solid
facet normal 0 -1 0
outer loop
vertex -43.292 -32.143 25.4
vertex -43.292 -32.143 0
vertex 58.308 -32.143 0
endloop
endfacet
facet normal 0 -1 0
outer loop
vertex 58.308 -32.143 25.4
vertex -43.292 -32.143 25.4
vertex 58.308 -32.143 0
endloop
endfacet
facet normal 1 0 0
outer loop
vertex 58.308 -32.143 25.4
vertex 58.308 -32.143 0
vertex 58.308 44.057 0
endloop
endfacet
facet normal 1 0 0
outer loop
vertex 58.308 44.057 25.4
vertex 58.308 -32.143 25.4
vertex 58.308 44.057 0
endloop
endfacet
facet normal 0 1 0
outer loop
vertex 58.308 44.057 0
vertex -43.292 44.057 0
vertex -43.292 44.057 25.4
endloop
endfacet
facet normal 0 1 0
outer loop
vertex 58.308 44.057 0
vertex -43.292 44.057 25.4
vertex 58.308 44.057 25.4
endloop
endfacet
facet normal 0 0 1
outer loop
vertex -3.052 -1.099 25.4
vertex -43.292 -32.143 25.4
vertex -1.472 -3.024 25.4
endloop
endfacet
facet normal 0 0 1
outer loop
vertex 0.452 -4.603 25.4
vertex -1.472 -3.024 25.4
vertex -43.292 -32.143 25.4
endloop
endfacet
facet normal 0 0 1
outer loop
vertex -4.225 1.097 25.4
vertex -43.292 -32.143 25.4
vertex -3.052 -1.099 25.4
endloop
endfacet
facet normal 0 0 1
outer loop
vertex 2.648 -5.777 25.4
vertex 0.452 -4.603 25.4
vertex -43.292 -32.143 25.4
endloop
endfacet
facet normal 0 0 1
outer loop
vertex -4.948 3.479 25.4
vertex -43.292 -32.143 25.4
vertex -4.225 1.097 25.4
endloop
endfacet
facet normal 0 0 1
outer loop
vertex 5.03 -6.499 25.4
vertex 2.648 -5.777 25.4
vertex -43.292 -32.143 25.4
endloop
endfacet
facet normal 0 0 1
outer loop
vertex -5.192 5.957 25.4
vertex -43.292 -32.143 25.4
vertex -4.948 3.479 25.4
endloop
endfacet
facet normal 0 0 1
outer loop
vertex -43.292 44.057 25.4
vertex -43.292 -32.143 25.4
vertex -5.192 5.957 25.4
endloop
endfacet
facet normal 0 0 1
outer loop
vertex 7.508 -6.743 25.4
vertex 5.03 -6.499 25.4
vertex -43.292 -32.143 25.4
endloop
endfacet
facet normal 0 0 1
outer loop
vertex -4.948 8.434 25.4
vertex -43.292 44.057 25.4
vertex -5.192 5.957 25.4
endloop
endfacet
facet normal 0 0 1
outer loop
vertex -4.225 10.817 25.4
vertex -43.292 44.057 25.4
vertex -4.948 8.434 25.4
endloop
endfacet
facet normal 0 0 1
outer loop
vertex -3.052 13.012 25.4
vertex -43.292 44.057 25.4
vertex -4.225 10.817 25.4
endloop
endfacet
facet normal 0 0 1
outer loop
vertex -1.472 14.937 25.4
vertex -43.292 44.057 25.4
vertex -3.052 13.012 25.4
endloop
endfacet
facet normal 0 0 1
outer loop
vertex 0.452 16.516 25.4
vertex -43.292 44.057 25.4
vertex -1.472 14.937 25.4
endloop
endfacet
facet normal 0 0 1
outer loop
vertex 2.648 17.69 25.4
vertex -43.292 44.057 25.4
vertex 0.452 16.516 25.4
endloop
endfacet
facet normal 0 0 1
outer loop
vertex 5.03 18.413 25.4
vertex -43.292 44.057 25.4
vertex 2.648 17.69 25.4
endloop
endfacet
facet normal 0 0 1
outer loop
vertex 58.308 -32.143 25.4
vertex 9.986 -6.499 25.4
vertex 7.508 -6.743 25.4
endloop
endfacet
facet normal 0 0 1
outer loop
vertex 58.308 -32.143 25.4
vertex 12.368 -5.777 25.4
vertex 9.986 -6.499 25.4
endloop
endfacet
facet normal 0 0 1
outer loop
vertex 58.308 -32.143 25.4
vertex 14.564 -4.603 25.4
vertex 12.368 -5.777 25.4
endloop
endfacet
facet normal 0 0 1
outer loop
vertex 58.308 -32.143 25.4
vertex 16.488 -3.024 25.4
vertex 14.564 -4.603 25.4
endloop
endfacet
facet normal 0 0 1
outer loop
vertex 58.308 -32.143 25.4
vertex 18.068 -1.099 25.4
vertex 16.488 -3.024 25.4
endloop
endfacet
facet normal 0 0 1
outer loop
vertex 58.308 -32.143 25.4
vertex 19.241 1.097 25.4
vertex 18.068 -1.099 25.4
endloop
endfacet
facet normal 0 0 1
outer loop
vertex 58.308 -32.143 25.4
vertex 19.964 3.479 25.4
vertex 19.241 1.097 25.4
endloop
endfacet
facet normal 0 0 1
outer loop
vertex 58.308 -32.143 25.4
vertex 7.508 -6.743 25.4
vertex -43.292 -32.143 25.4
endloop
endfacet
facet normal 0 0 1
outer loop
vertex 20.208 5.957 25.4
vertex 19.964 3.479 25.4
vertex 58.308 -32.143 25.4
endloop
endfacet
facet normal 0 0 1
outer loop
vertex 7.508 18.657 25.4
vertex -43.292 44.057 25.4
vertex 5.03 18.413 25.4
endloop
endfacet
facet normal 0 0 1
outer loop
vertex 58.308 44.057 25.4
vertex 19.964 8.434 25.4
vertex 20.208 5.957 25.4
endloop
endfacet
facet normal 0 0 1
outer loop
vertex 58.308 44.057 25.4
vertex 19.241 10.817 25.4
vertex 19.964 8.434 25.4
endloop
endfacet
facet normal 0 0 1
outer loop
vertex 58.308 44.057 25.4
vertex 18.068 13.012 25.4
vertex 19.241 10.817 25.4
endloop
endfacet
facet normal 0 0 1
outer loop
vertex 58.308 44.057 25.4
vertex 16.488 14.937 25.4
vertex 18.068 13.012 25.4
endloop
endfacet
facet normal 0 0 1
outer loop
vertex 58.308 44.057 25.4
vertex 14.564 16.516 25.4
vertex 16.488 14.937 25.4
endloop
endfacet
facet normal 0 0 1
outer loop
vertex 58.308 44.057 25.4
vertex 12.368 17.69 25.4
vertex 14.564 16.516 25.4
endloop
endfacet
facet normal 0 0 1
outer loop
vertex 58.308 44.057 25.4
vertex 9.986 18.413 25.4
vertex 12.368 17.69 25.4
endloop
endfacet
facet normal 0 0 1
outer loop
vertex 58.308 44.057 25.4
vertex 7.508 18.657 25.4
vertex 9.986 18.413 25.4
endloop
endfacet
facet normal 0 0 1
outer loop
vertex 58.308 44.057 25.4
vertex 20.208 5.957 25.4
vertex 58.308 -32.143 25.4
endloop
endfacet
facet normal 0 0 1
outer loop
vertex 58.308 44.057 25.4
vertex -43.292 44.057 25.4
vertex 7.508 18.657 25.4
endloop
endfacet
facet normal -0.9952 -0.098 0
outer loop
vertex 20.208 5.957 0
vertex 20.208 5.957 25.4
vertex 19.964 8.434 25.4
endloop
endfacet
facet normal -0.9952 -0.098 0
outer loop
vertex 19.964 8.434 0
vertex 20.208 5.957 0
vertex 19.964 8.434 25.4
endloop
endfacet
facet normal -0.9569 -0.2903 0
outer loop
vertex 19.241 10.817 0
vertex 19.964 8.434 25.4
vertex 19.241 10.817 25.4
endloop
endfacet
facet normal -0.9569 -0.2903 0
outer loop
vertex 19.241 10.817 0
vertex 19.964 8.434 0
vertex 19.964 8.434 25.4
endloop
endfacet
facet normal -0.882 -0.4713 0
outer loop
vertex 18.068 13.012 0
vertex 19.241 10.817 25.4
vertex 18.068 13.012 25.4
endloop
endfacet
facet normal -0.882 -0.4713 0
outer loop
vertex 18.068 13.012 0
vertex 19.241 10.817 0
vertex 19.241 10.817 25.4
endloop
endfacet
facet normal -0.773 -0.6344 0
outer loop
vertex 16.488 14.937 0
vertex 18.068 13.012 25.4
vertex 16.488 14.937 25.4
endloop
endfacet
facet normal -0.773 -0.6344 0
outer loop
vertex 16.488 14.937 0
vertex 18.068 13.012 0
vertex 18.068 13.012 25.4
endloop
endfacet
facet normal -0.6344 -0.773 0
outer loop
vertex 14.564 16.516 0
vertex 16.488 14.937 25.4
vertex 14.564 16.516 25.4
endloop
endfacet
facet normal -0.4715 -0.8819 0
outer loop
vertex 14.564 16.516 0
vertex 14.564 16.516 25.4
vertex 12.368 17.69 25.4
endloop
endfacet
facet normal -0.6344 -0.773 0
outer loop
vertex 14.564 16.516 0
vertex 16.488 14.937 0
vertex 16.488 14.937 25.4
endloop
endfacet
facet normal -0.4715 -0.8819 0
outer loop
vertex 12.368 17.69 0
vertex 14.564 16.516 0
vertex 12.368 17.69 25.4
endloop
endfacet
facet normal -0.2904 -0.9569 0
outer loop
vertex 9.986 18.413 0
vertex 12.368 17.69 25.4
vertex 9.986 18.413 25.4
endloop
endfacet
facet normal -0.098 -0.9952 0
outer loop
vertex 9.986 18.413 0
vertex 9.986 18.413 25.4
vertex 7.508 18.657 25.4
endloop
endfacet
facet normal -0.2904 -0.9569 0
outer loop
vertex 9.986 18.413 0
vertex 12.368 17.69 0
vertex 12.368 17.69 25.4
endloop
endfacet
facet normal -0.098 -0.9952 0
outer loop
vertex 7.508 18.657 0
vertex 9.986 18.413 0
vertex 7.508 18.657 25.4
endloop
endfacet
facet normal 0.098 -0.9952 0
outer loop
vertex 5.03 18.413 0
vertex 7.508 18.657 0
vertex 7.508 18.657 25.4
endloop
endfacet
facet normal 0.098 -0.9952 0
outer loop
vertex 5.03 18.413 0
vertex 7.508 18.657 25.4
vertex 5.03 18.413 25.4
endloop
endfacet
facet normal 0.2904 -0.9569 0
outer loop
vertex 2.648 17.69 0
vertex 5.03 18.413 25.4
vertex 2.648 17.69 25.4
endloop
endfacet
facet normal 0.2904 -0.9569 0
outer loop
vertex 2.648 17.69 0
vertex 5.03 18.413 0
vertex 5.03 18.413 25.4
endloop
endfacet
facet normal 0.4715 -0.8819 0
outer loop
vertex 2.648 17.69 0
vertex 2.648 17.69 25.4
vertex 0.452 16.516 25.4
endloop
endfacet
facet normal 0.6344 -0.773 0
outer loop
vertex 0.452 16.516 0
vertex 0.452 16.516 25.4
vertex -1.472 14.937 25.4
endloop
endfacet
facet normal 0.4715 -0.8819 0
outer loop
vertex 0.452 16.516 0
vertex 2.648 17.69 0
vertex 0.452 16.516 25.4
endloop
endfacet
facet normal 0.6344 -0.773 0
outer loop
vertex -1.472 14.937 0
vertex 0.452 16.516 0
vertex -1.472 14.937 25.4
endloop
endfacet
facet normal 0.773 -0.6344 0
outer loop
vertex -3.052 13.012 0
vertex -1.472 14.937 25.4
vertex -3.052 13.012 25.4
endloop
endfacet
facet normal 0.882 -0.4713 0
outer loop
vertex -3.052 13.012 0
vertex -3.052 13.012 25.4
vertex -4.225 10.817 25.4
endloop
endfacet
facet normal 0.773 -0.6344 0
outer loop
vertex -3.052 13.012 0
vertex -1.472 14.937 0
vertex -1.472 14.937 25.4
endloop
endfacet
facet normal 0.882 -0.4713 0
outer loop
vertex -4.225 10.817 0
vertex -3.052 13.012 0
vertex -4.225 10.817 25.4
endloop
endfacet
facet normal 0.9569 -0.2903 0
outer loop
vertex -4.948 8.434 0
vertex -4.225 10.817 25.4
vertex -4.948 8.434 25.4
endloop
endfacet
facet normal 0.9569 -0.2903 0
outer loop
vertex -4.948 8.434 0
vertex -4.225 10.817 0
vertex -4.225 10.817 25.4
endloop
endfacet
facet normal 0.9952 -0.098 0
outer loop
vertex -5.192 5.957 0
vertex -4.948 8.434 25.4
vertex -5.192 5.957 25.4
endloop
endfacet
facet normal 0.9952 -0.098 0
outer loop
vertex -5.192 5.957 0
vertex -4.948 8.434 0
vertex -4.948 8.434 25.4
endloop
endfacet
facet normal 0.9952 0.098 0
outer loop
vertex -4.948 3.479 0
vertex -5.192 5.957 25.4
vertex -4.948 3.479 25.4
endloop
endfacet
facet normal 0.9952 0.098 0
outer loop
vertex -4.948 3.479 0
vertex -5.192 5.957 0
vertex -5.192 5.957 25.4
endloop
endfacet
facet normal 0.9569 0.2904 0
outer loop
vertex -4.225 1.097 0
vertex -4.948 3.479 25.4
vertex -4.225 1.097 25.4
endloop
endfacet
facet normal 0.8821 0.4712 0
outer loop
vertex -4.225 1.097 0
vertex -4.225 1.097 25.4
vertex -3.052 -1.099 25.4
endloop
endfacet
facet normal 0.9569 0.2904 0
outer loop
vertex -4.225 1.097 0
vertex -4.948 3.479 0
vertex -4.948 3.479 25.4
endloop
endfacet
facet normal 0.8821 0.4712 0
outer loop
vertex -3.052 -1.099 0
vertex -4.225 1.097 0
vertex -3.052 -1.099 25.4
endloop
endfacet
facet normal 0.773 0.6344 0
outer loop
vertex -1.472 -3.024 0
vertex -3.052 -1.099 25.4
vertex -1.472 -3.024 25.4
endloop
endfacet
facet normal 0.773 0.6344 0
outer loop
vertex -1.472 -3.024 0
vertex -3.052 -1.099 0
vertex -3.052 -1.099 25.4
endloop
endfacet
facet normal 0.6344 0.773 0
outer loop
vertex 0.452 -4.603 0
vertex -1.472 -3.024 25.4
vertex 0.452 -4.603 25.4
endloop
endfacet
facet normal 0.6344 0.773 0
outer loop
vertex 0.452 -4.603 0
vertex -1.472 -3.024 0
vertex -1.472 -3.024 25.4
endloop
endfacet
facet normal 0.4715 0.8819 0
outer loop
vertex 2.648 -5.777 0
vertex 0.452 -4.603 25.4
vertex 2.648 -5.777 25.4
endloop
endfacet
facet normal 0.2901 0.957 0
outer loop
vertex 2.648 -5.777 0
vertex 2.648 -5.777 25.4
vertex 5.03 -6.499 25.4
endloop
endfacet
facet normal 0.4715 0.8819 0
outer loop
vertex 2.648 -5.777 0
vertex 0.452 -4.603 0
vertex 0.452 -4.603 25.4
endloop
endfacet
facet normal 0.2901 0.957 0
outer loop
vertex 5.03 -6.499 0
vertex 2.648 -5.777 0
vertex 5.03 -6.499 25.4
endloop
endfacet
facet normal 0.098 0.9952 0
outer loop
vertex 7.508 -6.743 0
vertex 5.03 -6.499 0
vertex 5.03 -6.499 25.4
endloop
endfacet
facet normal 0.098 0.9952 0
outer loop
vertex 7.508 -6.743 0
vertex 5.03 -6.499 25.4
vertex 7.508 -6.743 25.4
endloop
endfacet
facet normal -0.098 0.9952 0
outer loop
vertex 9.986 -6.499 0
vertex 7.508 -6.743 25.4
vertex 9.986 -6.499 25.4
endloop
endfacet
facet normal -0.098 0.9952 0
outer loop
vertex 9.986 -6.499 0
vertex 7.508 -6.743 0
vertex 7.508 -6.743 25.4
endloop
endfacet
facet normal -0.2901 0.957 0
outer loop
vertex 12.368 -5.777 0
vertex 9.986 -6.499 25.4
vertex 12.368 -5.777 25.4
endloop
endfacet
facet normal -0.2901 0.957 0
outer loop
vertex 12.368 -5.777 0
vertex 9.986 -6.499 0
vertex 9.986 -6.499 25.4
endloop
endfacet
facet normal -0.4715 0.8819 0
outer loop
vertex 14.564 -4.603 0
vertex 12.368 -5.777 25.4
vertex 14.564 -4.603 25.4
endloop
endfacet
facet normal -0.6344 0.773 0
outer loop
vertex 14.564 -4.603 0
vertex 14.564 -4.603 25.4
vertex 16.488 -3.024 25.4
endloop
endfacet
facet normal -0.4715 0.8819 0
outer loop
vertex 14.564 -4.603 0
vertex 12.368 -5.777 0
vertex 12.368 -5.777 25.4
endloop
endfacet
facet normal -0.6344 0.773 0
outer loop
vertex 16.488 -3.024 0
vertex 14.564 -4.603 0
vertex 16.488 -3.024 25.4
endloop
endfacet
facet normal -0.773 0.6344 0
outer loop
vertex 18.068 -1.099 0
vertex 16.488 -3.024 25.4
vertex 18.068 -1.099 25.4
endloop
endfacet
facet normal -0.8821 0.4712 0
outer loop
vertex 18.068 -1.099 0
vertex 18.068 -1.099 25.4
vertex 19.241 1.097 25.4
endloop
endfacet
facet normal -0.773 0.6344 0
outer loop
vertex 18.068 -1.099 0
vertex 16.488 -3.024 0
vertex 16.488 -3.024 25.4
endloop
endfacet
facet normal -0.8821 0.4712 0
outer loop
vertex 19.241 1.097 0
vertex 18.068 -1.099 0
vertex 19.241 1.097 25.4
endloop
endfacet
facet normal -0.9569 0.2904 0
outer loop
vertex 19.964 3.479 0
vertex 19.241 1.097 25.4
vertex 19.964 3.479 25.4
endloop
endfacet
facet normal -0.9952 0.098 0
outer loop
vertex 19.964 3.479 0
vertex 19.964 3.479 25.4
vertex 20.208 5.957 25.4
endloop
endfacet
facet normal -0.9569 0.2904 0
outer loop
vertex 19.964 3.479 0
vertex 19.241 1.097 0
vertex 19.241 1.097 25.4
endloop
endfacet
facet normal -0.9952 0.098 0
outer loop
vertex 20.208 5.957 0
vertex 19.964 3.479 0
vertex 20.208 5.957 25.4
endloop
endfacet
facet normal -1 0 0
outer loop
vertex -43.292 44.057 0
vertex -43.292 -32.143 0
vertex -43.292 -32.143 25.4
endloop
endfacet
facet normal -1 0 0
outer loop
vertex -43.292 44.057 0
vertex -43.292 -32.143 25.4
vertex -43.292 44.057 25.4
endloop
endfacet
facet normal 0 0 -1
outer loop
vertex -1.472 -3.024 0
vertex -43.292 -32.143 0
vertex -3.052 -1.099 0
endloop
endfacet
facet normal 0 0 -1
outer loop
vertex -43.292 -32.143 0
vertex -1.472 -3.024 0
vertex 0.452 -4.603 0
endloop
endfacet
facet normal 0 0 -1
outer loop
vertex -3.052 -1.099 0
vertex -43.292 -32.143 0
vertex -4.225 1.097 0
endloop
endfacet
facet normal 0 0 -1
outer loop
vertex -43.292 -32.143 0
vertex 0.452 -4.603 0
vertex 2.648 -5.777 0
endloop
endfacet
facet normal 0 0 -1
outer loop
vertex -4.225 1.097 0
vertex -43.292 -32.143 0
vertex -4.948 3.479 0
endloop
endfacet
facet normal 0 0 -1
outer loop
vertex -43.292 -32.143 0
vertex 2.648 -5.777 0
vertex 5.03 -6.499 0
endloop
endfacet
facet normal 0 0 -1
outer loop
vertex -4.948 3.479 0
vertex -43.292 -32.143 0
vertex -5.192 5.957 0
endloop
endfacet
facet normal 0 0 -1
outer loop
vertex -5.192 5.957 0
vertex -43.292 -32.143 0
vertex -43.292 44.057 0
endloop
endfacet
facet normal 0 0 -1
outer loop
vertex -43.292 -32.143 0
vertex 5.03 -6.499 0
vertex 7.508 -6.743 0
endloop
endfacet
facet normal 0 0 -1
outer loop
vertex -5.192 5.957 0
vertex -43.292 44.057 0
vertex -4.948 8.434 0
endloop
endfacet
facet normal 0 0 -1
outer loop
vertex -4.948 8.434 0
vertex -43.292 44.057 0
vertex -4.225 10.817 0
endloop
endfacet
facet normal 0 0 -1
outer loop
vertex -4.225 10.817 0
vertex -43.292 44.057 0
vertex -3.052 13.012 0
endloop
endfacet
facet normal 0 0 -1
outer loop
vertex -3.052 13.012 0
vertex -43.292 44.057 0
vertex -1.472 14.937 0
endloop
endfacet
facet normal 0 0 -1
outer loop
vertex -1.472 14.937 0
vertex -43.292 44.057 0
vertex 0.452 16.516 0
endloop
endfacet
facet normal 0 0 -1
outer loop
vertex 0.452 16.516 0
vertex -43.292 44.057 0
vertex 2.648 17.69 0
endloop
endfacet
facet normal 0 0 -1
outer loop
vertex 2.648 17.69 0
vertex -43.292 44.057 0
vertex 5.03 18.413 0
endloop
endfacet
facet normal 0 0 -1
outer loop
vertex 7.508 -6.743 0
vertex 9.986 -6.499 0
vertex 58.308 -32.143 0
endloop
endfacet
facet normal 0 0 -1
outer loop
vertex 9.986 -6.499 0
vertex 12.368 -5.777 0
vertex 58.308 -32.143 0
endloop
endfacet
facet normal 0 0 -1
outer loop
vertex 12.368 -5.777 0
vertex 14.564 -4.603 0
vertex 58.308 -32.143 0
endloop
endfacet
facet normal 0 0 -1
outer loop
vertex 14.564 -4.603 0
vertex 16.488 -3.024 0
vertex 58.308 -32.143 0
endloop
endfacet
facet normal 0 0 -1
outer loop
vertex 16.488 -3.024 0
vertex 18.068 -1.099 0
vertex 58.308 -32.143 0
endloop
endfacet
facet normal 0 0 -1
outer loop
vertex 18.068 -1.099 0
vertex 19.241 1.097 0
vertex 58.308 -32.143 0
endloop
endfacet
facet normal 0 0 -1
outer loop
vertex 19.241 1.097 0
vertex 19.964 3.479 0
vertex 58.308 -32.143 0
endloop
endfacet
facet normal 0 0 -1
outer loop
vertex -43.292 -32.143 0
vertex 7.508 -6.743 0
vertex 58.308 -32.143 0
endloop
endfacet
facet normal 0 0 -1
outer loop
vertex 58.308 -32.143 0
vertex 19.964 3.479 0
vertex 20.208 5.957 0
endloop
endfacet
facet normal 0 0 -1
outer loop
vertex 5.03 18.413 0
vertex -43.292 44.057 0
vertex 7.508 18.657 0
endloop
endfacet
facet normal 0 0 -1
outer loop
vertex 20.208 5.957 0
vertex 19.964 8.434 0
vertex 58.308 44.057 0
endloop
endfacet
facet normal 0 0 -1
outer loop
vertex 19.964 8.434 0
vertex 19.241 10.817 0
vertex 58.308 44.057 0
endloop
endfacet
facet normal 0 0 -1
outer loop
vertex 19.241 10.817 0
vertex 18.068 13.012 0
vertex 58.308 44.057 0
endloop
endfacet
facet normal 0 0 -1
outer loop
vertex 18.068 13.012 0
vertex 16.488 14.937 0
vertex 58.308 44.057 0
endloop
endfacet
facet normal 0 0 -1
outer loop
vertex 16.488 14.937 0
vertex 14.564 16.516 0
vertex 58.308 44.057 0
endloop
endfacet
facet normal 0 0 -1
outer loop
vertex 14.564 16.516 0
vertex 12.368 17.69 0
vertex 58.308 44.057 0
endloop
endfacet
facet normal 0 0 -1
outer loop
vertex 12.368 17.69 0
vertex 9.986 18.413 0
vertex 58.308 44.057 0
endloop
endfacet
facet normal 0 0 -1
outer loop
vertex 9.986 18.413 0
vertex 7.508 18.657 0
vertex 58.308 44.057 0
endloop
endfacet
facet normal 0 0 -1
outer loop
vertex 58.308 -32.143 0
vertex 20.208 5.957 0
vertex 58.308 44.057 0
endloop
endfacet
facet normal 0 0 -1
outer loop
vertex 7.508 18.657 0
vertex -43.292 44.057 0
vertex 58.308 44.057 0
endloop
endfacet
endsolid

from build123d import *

# Parameters (mm, degrees)
F0_W     = 101.6
F0_H     = 76.2
F0_R     = 12.7
F1_DEPTH = 25.4
F2_R     = 3.175
F4_DEPTH = 25.4


with BuildPart() as f1:
    # F0 (on Top) → F1 (new body)
    with BuildSketch(Plane.XY):
        with Locations((7.50792135, 5.9566022065)):
            Rectangle(F0_W, F0_H)
        with Locations((7.50792135, 5.9566022065)):
            Circle(F0_R, mode=Mode.SUBTRACT)
    extrude(amount=F1_DEPTH)

    # F2
    f2_edges = [f1.edges().sort_by_distance(p)[0] for p in [
        (-43.292079, 5.956602, 25.4),
        (7.507921, -32.143398, 25.4),
        (58.307921, 5.956602, 25.4),
        (7.507921, 44.056602, 25.4),
        (-5.192079, 5.956602, 25.4),
        (-43.292079, 5.956602, 0),
        (7.507921, -32.143398, 0),
        (58.307921, 5.956602, 0),
        (7.507921, 44.056602, 0),
        (-5.192079, 5.956602, 0),
        (58.307921, 44.056602, 12.7),
        (-43.292079, 44.056602, 12.7),
        (-43.292079, -32.143398, 12.7),
        (58.307921, -32.143398, 12.7),
    ]]
    fillet(f2_edges, radius=F2_R)


with BuildPart() as f4:
    # F0 (on Top) → F4 (new body)
    with BuildSketch(Plane.XY):
        with Locations((7.50792135, 5.9566022065)):
            Rectangle(F0_W, F0_H)
        with Locations((7.50792135, 5.9566022065)):
            Circle(F0_R, mode=Mode.SUBTRACT)
    extrude(amount=F4_DEPTH)


solid = f4.part
